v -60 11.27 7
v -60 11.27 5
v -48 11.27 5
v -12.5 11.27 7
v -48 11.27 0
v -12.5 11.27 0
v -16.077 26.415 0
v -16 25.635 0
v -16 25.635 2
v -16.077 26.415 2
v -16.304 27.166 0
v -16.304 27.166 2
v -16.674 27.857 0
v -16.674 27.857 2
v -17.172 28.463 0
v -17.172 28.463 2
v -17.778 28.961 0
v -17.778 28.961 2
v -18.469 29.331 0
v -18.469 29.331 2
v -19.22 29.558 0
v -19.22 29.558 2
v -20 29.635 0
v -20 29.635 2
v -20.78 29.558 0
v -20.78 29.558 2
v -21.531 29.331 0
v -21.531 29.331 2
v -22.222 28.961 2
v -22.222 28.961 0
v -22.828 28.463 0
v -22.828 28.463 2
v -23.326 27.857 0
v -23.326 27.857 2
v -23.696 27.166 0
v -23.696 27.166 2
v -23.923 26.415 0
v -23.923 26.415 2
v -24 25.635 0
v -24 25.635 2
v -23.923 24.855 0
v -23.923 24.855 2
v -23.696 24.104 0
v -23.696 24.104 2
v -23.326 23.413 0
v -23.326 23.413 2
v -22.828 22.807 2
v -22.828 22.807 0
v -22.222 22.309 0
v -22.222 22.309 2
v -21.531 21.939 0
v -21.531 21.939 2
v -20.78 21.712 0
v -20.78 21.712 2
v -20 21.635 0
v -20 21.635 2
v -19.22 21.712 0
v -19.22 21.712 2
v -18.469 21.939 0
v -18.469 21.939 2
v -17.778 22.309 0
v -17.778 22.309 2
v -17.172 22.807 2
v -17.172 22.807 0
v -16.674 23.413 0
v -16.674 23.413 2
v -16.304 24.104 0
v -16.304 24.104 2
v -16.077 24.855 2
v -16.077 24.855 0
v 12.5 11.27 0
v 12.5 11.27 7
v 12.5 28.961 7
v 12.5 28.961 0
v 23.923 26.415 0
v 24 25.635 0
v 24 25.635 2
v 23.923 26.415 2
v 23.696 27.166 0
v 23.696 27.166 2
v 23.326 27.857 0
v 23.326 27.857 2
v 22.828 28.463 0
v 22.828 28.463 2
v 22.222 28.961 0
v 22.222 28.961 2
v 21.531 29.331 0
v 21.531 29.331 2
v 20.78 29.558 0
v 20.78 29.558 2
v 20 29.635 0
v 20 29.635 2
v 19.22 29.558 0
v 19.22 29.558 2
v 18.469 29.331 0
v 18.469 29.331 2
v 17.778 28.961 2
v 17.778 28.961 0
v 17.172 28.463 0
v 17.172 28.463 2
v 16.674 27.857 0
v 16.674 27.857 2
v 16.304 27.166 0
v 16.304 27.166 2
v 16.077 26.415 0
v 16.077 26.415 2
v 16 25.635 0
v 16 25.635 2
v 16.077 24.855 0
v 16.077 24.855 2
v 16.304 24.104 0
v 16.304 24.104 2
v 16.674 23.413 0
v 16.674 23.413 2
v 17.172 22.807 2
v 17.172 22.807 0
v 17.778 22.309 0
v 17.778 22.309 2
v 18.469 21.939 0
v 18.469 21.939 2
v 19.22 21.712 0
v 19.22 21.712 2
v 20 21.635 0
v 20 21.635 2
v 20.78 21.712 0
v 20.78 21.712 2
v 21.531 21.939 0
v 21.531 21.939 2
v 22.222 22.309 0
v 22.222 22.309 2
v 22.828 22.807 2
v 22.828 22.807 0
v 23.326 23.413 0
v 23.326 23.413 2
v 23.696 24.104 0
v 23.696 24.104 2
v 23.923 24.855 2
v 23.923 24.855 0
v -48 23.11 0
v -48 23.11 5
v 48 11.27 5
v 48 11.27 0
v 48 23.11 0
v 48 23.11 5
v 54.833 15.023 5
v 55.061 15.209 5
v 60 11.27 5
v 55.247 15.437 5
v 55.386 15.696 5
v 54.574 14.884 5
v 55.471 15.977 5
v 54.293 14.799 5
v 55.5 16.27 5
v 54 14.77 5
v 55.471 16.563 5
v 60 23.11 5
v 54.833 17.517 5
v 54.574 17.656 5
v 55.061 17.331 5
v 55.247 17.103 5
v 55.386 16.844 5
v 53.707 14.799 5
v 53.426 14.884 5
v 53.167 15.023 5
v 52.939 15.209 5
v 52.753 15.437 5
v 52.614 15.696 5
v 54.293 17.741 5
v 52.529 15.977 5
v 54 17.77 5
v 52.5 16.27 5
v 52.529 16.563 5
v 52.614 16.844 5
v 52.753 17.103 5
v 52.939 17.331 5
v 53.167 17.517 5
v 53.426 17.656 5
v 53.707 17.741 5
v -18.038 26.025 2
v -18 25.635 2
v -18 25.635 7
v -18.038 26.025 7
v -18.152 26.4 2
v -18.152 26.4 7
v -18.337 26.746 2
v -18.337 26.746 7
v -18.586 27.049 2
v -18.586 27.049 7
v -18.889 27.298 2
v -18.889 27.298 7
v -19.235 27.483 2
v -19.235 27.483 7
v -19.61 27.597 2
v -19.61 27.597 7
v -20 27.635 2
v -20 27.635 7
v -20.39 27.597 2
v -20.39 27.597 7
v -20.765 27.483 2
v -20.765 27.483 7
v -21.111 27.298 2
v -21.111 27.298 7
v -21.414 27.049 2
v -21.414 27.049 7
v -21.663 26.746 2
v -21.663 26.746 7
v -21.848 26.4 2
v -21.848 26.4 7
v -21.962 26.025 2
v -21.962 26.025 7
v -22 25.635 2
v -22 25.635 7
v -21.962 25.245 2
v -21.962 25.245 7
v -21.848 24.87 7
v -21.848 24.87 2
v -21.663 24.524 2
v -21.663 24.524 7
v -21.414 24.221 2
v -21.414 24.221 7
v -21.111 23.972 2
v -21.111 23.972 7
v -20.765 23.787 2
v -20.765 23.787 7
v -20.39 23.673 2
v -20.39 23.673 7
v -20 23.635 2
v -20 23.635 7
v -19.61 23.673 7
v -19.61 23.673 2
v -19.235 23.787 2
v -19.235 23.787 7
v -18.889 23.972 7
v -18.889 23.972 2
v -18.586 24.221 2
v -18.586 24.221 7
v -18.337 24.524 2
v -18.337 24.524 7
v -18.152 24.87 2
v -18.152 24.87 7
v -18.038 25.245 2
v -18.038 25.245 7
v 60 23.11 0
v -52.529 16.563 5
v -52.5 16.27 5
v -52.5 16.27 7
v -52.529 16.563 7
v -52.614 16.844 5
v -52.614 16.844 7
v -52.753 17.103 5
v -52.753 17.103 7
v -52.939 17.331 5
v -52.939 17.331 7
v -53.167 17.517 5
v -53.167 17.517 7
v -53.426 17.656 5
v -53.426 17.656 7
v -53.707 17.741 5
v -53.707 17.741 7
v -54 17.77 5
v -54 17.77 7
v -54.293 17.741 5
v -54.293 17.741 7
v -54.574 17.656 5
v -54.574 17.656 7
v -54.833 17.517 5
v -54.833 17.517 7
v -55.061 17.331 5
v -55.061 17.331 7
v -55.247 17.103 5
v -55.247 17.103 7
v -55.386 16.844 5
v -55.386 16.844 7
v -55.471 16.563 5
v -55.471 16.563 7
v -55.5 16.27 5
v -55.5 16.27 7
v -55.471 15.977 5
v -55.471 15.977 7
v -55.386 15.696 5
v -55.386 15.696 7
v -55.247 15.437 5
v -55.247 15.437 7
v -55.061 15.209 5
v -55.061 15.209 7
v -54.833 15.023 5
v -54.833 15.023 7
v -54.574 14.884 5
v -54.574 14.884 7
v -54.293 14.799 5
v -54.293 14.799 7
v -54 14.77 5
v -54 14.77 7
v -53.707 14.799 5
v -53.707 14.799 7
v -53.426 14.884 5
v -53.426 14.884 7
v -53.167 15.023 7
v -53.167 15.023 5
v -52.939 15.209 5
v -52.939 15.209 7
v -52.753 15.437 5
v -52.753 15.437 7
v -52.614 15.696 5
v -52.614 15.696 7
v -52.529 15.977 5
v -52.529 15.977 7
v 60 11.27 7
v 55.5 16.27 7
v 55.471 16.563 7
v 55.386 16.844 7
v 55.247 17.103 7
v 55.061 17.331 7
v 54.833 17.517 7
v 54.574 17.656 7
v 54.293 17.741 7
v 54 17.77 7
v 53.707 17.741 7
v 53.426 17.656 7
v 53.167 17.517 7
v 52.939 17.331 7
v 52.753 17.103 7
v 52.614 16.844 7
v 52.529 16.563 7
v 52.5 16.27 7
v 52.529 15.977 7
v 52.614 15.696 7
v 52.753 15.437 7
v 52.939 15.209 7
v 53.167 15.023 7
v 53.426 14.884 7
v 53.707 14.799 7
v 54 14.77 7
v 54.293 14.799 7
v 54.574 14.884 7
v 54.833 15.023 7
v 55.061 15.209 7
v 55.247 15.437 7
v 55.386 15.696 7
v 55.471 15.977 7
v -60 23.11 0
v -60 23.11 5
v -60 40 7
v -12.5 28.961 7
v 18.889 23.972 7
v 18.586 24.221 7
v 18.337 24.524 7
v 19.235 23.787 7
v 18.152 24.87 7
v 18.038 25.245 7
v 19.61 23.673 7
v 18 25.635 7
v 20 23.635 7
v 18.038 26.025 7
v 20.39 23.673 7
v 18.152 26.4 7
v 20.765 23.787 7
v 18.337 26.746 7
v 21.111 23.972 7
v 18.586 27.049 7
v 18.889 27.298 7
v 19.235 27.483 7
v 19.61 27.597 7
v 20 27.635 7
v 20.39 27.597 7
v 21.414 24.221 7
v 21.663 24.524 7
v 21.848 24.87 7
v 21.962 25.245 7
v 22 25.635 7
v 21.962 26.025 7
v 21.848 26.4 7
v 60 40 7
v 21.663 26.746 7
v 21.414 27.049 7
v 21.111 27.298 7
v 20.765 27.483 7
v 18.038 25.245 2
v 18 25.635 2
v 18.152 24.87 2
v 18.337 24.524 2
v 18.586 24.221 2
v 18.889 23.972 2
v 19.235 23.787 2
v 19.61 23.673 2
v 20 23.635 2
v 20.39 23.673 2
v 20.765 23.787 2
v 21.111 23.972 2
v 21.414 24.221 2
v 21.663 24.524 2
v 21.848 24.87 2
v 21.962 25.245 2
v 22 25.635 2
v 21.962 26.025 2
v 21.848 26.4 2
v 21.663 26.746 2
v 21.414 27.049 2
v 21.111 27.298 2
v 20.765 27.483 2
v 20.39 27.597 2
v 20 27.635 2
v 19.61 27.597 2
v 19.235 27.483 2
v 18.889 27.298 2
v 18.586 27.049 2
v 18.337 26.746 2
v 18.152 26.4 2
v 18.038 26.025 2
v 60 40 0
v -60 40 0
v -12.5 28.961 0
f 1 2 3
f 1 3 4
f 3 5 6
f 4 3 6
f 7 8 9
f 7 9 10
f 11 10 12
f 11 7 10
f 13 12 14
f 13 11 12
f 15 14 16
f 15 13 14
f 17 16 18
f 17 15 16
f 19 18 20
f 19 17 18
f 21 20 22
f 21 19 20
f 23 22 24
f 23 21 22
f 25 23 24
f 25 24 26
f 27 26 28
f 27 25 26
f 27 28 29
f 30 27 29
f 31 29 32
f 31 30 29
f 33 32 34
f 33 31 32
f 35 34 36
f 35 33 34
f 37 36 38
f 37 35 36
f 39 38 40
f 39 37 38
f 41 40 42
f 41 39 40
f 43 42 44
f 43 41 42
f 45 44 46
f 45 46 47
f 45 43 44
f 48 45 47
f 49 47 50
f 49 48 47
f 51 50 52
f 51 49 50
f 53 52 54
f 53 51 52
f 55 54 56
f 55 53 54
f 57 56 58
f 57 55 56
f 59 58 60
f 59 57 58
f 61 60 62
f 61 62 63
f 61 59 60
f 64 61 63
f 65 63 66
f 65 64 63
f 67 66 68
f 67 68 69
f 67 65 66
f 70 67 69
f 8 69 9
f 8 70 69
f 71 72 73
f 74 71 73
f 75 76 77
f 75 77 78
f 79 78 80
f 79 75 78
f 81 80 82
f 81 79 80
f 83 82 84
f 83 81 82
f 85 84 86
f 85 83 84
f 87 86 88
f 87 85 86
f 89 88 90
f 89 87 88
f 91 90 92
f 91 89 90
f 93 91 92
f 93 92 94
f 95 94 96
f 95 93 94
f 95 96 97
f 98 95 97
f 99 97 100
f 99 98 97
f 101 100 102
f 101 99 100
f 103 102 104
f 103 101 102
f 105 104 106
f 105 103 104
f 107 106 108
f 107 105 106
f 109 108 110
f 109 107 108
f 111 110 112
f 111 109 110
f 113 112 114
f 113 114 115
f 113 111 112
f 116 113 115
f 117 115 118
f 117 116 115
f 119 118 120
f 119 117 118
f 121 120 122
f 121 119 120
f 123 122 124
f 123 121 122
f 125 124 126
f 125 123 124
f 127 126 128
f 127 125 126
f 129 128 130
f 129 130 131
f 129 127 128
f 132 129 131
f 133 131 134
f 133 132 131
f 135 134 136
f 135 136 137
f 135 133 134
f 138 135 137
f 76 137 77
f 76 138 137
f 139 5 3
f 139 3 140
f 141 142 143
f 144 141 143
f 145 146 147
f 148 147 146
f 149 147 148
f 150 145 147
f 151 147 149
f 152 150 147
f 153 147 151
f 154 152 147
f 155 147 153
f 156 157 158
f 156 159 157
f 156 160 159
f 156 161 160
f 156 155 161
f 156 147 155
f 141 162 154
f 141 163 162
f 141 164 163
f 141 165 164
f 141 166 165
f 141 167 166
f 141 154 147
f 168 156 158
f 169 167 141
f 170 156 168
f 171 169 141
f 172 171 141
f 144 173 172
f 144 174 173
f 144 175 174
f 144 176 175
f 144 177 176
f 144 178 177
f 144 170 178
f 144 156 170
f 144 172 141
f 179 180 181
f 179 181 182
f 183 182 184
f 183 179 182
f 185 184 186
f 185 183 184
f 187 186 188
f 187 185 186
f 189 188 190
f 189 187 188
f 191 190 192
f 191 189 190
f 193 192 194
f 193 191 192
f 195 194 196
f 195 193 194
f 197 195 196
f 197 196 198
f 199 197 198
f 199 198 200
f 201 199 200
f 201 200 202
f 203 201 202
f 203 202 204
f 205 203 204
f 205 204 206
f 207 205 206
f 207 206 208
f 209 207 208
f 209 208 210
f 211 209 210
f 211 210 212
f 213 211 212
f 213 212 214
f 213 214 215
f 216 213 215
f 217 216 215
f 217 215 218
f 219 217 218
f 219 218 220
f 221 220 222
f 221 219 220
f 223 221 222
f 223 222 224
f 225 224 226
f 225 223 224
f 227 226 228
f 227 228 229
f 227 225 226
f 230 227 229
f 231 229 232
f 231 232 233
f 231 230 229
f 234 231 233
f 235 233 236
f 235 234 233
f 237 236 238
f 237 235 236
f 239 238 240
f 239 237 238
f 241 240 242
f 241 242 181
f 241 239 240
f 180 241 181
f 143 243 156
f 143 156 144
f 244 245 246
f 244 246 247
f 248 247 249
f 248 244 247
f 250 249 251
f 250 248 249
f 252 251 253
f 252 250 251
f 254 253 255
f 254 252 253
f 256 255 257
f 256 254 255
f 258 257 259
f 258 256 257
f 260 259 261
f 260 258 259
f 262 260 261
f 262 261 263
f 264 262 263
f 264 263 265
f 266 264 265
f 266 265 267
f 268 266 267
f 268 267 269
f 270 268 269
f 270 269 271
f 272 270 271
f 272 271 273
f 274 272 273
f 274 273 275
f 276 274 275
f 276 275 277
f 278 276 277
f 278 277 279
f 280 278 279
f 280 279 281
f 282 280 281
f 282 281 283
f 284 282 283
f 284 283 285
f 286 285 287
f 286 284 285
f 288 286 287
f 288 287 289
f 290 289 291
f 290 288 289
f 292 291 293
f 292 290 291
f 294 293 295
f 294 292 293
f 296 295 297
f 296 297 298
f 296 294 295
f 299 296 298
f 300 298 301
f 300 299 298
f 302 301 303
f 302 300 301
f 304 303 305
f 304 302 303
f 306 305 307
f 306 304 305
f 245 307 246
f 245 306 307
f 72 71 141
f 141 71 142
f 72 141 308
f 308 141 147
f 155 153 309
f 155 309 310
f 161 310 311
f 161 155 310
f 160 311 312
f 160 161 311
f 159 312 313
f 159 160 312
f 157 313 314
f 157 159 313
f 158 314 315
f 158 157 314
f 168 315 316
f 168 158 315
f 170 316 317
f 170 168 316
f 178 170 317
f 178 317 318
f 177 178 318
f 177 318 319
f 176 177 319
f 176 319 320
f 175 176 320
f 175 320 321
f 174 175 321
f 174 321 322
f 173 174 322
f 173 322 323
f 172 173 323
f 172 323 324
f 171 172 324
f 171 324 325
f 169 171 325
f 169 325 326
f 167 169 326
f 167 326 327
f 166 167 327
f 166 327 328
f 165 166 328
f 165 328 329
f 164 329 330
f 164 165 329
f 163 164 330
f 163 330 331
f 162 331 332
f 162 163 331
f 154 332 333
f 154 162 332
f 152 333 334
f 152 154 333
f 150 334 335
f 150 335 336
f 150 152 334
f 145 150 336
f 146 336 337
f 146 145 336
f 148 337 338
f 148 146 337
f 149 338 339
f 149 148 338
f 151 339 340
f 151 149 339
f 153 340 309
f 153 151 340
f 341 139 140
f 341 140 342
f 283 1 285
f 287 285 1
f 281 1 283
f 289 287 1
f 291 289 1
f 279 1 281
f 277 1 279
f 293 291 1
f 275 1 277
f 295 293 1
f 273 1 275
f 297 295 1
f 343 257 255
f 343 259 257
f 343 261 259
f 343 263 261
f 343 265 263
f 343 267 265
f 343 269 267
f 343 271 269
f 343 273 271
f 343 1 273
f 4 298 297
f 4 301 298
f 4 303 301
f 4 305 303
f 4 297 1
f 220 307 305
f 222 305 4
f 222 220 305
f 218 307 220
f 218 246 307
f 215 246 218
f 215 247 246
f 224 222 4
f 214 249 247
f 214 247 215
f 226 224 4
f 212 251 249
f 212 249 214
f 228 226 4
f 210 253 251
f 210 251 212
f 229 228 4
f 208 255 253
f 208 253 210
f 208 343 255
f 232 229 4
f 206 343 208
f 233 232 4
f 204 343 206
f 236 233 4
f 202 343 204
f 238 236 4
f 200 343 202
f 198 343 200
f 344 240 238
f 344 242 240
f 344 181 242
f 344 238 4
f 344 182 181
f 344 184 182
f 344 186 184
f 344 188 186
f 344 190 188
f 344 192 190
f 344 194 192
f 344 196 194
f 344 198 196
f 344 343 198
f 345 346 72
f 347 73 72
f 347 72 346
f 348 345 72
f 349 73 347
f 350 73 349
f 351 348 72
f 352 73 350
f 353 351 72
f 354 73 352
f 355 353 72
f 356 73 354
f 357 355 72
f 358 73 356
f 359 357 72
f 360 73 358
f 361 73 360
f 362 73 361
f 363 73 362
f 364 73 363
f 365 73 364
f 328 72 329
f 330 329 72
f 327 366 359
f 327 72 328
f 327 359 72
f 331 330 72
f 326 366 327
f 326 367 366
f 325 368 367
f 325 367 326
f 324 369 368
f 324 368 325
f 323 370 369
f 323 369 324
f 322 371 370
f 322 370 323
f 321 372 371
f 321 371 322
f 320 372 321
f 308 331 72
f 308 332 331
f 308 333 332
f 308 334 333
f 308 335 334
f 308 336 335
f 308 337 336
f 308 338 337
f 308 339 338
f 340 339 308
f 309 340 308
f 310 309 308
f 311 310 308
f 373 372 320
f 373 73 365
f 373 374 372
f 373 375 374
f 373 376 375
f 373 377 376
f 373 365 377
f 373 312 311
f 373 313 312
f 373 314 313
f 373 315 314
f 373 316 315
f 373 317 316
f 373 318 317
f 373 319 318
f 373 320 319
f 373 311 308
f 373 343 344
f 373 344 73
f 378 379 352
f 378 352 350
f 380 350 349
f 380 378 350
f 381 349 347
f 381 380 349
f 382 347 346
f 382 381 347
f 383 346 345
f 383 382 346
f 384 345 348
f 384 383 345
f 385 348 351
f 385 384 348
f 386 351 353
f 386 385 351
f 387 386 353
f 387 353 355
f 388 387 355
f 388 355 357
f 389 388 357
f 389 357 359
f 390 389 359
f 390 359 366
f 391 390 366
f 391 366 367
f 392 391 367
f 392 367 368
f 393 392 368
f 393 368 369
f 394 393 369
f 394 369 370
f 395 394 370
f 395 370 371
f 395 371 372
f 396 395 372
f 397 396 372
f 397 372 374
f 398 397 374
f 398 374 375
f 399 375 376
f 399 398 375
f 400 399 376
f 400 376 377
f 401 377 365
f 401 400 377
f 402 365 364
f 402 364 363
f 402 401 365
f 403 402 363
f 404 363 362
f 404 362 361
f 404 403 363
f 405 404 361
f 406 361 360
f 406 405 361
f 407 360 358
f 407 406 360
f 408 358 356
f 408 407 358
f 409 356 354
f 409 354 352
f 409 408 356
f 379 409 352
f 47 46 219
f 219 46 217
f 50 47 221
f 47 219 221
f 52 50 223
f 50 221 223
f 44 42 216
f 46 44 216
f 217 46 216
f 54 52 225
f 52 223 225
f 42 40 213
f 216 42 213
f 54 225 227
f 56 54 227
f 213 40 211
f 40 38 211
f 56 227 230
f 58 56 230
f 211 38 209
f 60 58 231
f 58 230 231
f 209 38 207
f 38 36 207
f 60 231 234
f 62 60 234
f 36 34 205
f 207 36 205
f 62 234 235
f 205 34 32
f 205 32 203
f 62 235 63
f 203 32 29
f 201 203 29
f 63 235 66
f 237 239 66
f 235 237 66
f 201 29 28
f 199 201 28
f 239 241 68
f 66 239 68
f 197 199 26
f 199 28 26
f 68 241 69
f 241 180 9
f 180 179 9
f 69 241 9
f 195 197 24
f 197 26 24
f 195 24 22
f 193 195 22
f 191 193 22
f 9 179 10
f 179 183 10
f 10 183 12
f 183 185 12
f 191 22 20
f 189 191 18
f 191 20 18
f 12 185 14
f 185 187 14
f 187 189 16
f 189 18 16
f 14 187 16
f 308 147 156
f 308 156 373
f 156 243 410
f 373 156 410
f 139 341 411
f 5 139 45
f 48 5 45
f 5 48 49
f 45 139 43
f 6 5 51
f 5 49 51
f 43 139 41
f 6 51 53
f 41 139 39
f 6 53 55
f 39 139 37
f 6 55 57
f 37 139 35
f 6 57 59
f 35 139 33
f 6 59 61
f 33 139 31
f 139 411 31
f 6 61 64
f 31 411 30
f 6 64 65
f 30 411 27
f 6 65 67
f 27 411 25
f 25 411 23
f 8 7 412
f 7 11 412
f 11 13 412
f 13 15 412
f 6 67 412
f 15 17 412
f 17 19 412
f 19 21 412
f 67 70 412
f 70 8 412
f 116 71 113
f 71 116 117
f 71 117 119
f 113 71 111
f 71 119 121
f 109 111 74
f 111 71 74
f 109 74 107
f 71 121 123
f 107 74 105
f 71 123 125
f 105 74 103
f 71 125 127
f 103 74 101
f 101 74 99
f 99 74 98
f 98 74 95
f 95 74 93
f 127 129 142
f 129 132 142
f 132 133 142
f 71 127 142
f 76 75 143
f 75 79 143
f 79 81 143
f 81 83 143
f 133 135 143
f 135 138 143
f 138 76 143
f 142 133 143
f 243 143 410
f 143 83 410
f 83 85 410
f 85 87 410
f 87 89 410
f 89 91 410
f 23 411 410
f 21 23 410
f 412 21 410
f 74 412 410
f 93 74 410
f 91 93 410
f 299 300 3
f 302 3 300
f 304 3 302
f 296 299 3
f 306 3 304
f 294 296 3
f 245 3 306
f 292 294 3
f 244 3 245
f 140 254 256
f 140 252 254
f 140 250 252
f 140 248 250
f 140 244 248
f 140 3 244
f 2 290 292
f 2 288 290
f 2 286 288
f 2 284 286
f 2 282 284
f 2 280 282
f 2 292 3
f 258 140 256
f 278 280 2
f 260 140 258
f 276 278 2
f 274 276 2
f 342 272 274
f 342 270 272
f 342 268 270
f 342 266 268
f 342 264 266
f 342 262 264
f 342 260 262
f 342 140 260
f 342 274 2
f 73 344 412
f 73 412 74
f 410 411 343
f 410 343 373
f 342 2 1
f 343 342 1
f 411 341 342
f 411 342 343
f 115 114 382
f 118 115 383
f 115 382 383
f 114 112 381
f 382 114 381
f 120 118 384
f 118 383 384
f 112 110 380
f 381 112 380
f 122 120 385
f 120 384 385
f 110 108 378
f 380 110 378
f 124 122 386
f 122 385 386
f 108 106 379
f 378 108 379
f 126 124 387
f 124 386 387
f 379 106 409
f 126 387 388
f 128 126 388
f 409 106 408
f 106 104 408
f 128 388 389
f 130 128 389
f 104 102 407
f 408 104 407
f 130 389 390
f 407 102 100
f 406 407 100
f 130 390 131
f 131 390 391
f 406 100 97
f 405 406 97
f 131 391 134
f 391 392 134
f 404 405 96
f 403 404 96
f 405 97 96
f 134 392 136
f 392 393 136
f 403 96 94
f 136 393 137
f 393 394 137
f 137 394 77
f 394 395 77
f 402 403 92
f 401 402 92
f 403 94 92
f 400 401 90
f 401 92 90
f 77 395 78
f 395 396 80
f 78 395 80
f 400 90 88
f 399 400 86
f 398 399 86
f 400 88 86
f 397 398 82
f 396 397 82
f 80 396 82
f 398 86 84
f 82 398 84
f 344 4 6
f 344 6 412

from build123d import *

# Parameters (mm, degrees)
SKETCH2_W           = 120
SKETCH2_H           = 28.73
SKETCH2_R           = 1.5
SKETCH2_R_2         = 2
BOSS_EXTRUDE1_DEPTH = 7
SKETCH3_W           = 12
SKETCH3_H           = 13.95
CUT_EXTRUDE1_DEPTH  = 5
SKETCH4_W           = 25
SKETCH4_H           = 46.747057702
CUT_EXTRUDE2_DEPTH  = 7
SKETCH5_R           = 4
CUT_EXTRUDE3_DEPTH  = 2


with BuildPart() as part:
    # Sketch2 → Boss-Extrude1 (new body)
    with BuildSketch(Plane.XY):
        with Locations((0, 25.635)):
            Rectangle(SKETCH2_W, SKETCH2_H)
        with Locations((-54, 16.27)):
            Circle(SKETCH2_R, mode=Mode.SUBTRACT)
        with Locations((54, 16.27)):
            Circle(SKETCH2_R, mode=Mode.SUBTRACT)
        with Locations((-20, 25.635)):
            Circle(SKETCH2_R_2, mode=Mode.SUBTRACT)
        with Locations(Location((20, 25.635, 0), (0, 0, 180))):
            Circle(SKETCH2_R_2, mode=Mode.SUBTRACT)
    extrude(amount=BOSS_EXTRUDE1_DEPTH)

    # Sketch3 → Cut-Extrude1 (cut)
    with BuildSketch(Plane(origin=(0, 0, 0), x_dir=(-1, 0, 0), z_dir=(0, 0, -1))):
        with Locations((-54, 16.135)):
            Rectangle(SKETCH3_W, SKETCH3_H)
        with Locations((54, 16.135)):
            Rectangle(SKETCH3_W, SKETCH3_H)
    extrude(amount=-CUT_EXTRUDE1_DEPTH, mode=Mode.SUBTRACT)

    # Sketch4 → Cut-Extrude2 (cut)
    with BuildSketch(Plane.XY.offset(7)):
        with Locations((0, 5.58721862)):
            Rectangle(SKETCH4_W, SKETCH4_H)
    extrude(amount=-CUT_EXTRUDE2_DEPTH, mode=Mode.SUBTRACT)

    # Sketch5 → Cut-Extrude3 (cut)
    with BuildSketch(Plane.XY):
        with Locations((20, 25.635)):
            Circle(SKETCH5_R)
        with Locations((-20, 25.635)):
            Circle(SKETCH5_R)
    extrude(amount=CUT_EXTRUDE3_DEPTH, mode=Mode.SUBTRACT)


solid = part.part
